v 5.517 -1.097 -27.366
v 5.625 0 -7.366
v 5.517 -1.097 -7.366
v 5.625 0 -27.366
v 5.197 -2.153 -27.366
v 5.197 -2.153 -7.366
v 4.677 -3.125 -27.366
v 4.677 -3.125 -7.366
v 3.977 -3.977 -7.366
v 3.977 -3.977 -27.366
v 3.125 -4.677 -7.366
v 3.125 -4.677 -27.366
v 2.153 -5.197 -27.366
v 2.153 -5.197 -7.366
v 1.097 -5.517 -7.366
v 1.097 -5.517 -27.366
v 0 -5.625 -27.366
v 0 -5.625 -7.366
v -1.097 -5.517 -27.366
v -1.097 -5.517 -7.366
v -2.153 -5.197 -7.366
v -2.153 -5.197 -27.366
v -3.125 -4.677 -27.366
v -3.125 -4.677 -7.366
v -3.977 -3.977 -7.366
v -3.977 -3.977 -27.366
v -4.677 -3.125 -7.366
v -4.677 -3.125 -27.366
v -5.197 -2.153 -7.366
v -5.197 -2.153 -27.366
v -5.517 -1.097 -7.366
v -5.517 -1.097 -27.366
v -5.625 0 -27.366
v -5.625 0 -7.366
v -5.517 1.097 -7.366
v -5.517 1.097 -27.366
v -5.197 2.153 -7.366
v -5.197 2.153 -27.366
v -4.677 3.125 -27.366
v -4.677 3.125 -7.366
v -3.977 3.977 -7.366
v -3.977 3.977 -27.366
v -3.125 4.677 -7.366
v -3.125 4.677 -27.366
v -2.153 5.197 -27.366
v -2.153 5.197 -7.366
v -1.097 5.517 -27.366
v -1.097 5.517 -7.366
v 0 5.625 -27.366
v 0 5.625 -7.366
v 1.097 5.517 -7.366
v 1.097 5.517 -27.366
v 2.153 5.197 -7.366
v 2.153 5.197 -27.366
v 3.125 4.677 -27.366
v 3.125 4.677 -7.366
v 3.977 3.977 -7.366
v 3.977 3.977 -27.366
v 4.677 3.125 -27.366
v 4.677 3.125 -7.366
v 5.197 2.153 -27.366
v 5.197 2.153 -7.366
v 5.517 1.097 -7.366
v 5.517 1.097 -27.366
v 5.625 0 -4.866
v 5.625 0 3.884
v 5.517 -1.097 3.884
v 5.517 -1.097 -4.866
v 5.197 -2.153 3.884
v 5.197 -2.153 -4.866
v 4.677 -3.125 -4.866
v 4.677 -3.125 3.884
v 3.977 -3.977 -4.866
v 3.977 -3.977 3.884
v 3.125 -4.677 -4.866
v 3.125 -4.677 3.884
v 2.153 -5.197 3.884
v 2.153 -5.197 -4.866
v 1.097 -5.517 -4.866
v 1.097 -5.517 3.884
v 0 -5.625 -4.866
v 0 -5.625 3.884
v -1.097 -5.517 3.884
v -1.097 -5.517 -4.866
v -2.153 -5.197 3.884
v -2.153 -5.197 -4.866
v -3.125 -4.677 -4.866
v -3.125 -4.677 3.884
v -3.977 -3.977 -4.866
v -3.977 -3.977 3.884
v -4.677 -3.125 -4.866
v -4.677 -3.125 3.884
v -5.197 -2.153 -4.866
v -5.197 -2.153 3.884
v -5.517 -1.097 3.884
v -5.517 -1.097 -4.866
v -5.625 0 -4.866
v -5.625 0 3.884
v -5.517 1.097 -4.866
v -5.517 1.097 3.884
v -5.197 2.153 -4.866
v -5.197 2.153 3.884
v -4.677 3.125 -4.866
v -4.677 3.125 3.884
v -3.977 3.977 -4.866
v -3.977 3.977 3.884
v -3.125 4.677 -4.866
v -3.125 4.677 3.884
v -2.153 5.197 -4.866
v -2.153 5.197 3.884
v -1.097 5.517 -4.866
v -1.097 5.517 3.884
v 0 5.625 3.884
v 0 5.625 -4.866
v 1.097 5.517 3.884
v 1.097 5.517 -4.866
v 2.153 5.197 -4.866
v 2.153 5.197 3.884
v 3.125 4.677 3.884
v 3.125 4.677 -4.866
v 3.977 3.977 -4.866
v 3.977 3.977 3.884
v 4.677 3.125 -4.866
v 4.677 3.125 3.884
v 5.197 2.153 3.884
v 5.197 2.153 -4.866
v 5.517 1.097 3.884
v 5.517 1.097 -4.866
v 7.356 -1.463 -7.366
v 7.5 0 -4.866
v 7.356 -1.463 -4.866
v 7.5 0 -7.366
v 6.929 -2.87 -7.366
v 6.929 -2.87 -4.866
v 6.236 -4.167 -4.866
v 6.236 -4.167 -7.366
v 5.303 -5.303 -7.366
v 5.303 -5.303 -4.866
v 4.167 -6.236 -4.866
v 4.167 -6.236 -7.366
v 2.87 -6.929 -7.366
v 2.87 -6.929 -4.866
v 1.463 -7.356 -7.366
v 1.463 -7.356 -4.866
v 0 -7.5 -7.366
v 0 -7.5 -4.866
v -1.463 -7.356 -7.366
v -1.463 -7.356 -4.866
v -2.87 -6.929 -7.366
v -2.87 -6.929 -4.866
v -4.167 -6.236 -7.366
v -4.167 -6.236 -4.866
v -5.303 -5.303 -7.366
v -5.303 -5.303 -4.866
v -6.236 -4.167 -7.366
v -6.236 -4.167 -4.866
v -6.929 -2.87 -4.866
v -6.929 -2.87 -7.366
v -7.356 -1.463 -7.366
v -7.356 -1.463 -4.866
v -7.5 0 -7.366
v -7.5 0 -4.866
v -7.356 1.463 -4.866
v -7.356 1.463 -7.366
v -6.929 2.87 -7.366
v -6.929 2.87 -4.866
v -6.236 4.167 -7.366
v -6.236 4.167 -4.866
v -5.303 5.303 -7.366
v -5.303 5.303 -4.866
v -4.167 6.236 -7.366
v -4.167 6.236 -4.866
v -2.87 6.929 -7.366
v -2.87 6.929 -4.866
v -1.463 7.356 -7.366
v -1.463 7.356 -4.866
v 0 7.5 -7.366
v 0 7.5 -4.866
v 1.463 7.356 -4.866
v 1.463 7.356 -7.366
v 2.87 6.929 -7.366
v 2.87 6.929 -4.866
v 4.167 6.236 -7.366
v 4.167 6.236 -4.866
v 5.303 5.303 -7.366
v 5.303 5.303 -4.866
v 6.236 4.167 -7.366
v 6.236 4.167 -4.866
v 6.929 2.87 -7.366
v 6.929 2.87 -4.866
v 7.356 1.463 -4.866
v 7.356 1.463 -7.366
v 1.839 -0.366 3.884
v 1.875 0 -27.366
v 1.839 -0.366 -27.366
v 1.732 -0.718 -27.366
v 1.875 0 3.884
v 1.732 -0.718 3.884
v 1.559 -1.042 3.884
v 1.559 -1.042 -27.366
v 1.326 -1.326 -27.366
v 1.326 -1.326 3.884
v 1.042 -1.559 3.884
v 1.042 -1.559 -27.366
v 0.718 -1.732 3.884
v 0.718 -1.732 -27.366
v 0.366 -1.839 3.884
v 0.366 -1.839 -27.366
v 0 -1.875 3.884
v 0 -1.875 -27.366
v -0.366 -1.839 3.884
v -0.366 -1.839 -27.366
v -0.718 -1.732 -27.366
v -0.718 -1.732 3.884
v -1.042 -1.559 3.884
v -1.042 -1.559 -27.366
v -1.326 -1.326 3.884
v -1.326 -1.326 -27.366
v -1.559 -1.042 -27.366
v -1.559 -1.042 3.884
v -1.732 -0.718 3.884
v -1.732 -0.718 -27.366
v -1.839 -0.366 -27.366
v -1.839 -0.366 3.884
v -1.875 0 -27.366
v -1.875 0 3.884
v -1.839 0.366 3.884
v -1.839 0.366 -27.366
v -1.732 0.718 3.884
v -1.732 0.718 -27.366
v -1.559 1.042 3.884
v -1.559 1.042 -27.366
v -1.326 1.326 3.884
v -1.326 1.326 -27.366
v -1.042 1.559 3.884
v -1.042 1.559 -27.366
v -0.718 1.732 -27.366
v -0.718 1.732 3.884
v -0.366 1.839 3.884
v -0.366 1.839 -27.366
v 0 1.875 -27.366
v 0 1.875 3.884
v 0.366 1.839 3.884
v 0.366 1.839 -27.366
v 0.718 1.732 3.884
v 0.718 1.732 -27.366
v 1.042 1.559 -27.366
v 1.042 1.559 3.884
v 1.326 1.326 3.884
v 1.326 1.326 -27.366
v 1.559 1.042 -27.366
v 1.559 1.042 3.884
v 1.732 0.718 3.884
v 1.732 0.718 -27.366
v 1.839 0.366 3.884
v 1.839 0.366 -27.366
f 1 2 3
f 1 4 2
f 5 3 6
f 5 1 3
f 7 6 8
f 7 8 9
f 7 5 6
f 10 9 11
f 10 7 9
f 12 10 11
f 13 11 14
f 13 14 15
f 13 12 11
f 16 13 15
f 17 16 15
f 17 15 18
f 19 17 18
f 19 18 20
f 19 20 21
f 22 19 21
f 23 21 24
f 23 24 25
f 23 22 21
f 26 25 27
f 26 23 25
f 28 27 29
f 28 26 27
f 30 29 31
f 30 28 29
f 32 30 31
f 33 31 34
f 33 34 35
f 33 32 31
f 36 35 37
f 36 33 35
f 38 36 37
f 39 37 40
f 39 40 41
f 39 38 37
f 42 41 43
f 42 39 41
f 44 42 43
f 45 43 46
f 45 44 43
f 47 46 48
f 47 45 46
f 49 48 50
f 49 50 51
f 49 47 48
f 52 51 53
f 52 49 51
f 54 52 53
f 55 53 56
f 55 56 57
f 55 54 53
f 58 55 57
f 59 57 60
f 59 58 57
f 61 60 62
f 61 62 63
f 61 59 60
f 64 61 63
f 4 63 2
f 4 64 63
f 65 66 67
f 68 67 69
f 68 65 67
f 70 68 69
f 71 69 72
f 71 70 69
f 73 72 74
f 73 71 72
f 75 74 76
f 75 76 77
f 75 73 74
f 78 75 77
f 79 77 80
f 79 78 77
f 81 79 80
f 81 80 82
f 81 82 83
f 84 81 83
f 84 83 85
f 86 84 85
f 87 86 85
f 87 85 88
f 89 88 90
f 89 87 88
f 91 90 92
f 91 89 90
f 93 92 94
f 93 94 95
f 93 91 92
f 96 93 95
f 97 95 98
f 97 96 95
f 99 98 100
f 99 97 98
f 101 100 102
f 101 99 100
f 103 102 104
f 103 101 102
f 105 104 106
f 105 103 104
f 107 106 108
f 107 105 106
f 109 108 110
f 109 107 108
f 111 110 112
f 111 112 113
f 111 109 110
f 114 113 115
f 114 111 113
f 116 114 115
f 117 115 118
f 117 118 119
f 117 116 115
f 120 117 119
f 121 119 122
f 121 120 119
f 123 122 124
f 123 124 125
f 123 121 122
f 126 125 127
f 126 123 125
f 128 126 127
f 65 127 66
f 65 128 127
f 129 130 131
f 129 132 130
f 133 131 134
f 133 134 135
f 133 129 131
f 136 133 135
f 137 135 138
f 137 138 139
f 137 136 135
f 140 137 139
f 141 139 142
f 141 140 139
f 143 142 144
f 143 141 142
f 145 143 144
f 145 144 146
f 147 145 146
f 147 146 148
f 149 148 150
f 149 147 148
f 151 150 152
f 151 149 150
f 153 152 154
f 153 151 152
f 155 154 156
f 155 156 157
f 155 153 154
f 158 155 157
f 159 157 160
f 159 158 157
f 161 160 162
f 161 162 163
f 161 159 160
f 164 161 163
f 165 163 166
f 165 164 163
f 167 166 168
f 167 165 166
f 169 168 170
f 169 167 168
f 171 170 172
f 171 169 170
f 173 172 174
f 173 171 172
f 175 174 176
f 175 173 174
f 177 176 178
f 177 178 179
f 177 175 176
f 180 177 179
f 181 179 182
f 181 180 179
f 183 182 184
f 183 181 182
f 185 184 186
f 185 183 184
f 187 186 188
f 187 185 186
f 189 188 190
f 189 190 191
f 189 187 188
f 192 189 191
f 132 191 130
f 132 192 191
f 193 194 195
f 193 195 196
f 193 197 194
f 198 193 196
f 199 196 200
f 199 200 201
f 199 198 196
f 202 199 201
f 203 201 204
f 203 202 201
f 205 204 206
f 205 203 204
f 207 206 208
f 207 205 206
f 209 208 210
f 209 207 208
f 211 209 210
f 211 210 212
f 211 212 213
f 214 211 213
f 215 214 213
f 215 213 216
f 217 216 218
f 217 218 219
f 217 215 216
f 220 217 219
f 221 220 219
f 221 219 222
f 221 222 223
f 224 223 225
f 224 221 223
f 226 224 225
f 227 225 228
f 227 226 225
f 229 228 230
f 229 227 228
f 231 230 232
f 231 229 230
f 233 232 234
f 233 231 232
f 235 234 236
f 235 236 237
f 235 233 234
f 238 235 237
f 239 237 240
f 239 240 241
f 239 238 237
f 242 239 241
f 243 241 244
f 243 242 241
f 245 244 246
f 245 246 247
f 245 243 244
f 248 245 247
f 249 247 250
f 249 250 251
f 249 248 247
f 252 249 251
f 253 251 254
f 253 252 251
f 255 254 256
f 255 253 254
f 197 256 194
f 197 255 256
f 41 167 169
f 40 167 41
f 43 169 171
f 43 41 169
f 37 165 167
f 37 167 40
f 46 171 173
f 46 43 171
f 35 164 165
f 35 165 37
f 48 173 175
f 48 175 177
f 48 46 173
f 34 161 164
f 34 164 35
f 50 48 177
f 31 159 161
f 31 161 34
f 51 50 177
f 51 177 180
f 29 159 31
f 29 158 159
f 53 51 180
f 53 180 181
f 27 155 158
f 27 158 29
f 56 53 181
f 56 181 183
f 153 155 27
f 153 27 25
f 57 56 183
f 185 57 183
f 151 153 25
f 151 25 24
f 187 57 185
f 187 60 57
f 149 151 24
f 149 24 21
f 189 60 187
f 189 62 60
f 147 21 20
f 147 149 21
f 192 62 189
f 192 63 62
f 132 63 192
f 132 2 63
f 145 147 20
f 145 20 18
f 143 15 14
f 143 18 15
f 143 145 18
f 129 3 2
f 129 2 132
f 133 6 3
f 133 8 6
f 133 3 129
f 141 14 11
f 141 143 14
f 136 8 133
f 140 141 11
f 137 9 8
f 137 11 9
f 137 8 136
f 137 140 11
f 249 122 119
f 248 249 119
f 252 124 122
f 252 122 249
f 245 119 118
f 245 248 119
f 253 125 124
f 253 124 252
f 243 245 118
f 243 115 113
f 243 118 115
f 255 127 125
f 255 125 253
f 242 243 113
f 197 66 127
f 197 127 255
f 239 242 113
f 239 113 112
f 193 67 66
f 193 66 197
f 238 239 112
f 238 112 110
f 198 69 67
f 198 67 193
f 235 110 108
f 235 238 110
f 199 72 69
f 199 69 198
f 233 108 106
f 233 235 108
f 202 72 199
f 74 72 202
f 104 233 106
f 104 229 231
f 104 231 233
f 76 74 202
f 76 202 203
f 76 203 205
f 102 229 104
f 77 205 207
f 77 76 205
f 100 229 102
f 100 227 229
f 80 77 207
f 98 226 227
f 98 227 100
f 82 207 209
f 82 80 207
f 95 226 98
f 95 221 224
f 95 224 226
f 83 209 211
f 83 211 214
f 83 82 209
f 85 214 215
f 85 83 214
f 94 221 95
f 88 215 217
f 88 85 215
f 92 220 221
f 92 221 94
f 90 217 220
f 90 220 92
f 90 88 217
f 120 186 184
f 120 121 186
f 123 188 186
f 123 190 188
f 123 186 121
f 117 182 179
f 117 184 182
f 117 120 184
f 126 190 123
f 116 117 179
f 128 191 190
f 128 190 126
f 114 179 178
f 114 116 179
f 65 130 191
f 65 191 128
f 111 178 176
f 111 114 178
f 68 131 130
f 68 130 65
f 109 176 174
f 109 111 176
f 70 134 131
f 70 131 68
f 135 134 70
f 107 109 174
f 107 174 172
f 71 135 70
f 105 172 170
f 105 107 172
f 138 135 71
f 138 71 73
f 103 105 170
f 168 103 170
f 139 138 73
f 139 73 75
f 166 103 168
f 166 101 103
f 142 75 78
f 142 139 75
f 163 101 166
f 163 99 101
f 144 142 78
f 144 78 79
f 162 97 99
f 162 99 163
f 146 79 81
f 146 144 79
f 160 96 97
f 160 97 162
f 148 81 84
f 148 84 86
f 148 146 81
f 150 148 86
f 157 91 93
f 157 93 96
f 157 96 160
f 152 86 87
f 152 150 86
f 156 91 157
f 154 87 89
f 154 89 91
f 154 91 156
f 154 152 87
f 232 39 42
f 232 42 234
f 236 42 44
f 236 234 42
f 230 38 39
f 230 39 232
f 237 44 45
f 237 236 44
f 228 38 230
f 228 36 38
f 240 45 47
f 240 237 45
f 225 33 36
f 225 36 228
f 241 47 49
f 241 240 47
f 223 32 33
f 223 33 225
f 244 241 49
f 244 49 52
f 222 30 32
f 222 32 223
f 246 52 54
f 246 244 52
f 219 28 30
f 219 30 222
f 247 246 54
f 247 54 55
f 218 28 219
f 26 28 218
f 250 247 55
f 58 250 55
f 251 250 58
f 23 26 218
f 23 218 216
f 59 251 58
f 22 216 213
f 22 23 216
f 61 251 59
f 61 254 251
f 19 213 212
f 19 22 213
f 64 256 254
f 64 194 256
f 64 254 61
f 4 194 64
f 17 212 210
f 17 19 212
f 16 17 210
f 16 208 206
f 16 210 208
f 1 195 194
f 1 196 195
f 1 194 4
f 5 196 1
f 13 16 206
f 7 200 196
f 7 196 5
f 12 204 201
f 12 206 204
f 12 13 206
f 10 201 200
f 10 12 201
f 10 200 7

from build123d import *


with BuildPart() as part:
    # Çizim1 → Döndür1 (revolve)
    with BuildSketch(Plane(origin=(0, 0, 0), x_dir=(0, 0, -1), z_dir=(1, 0, 0)), mode=Mode.PRIVATE) as d_nd_r1_sk:
        Polygon((7.365702479, 5.625), (27.365702479, 5.625), (27.365702479, 1.875), (-3.884297521, 1.875), (-3.884297521, 5.625), (4.865702479, 5.625), (4.865702479, 7.5), (7.365702479, 7.5), align=None)
    revolve(d_nd_r1_sk.sketch.rotate(Axis((0, 0, 4.380165289), (0, 0, -1)), 90), axis=Axis((0, 0, 4.380165289), (0, 0, -1)))


solid = part.part
